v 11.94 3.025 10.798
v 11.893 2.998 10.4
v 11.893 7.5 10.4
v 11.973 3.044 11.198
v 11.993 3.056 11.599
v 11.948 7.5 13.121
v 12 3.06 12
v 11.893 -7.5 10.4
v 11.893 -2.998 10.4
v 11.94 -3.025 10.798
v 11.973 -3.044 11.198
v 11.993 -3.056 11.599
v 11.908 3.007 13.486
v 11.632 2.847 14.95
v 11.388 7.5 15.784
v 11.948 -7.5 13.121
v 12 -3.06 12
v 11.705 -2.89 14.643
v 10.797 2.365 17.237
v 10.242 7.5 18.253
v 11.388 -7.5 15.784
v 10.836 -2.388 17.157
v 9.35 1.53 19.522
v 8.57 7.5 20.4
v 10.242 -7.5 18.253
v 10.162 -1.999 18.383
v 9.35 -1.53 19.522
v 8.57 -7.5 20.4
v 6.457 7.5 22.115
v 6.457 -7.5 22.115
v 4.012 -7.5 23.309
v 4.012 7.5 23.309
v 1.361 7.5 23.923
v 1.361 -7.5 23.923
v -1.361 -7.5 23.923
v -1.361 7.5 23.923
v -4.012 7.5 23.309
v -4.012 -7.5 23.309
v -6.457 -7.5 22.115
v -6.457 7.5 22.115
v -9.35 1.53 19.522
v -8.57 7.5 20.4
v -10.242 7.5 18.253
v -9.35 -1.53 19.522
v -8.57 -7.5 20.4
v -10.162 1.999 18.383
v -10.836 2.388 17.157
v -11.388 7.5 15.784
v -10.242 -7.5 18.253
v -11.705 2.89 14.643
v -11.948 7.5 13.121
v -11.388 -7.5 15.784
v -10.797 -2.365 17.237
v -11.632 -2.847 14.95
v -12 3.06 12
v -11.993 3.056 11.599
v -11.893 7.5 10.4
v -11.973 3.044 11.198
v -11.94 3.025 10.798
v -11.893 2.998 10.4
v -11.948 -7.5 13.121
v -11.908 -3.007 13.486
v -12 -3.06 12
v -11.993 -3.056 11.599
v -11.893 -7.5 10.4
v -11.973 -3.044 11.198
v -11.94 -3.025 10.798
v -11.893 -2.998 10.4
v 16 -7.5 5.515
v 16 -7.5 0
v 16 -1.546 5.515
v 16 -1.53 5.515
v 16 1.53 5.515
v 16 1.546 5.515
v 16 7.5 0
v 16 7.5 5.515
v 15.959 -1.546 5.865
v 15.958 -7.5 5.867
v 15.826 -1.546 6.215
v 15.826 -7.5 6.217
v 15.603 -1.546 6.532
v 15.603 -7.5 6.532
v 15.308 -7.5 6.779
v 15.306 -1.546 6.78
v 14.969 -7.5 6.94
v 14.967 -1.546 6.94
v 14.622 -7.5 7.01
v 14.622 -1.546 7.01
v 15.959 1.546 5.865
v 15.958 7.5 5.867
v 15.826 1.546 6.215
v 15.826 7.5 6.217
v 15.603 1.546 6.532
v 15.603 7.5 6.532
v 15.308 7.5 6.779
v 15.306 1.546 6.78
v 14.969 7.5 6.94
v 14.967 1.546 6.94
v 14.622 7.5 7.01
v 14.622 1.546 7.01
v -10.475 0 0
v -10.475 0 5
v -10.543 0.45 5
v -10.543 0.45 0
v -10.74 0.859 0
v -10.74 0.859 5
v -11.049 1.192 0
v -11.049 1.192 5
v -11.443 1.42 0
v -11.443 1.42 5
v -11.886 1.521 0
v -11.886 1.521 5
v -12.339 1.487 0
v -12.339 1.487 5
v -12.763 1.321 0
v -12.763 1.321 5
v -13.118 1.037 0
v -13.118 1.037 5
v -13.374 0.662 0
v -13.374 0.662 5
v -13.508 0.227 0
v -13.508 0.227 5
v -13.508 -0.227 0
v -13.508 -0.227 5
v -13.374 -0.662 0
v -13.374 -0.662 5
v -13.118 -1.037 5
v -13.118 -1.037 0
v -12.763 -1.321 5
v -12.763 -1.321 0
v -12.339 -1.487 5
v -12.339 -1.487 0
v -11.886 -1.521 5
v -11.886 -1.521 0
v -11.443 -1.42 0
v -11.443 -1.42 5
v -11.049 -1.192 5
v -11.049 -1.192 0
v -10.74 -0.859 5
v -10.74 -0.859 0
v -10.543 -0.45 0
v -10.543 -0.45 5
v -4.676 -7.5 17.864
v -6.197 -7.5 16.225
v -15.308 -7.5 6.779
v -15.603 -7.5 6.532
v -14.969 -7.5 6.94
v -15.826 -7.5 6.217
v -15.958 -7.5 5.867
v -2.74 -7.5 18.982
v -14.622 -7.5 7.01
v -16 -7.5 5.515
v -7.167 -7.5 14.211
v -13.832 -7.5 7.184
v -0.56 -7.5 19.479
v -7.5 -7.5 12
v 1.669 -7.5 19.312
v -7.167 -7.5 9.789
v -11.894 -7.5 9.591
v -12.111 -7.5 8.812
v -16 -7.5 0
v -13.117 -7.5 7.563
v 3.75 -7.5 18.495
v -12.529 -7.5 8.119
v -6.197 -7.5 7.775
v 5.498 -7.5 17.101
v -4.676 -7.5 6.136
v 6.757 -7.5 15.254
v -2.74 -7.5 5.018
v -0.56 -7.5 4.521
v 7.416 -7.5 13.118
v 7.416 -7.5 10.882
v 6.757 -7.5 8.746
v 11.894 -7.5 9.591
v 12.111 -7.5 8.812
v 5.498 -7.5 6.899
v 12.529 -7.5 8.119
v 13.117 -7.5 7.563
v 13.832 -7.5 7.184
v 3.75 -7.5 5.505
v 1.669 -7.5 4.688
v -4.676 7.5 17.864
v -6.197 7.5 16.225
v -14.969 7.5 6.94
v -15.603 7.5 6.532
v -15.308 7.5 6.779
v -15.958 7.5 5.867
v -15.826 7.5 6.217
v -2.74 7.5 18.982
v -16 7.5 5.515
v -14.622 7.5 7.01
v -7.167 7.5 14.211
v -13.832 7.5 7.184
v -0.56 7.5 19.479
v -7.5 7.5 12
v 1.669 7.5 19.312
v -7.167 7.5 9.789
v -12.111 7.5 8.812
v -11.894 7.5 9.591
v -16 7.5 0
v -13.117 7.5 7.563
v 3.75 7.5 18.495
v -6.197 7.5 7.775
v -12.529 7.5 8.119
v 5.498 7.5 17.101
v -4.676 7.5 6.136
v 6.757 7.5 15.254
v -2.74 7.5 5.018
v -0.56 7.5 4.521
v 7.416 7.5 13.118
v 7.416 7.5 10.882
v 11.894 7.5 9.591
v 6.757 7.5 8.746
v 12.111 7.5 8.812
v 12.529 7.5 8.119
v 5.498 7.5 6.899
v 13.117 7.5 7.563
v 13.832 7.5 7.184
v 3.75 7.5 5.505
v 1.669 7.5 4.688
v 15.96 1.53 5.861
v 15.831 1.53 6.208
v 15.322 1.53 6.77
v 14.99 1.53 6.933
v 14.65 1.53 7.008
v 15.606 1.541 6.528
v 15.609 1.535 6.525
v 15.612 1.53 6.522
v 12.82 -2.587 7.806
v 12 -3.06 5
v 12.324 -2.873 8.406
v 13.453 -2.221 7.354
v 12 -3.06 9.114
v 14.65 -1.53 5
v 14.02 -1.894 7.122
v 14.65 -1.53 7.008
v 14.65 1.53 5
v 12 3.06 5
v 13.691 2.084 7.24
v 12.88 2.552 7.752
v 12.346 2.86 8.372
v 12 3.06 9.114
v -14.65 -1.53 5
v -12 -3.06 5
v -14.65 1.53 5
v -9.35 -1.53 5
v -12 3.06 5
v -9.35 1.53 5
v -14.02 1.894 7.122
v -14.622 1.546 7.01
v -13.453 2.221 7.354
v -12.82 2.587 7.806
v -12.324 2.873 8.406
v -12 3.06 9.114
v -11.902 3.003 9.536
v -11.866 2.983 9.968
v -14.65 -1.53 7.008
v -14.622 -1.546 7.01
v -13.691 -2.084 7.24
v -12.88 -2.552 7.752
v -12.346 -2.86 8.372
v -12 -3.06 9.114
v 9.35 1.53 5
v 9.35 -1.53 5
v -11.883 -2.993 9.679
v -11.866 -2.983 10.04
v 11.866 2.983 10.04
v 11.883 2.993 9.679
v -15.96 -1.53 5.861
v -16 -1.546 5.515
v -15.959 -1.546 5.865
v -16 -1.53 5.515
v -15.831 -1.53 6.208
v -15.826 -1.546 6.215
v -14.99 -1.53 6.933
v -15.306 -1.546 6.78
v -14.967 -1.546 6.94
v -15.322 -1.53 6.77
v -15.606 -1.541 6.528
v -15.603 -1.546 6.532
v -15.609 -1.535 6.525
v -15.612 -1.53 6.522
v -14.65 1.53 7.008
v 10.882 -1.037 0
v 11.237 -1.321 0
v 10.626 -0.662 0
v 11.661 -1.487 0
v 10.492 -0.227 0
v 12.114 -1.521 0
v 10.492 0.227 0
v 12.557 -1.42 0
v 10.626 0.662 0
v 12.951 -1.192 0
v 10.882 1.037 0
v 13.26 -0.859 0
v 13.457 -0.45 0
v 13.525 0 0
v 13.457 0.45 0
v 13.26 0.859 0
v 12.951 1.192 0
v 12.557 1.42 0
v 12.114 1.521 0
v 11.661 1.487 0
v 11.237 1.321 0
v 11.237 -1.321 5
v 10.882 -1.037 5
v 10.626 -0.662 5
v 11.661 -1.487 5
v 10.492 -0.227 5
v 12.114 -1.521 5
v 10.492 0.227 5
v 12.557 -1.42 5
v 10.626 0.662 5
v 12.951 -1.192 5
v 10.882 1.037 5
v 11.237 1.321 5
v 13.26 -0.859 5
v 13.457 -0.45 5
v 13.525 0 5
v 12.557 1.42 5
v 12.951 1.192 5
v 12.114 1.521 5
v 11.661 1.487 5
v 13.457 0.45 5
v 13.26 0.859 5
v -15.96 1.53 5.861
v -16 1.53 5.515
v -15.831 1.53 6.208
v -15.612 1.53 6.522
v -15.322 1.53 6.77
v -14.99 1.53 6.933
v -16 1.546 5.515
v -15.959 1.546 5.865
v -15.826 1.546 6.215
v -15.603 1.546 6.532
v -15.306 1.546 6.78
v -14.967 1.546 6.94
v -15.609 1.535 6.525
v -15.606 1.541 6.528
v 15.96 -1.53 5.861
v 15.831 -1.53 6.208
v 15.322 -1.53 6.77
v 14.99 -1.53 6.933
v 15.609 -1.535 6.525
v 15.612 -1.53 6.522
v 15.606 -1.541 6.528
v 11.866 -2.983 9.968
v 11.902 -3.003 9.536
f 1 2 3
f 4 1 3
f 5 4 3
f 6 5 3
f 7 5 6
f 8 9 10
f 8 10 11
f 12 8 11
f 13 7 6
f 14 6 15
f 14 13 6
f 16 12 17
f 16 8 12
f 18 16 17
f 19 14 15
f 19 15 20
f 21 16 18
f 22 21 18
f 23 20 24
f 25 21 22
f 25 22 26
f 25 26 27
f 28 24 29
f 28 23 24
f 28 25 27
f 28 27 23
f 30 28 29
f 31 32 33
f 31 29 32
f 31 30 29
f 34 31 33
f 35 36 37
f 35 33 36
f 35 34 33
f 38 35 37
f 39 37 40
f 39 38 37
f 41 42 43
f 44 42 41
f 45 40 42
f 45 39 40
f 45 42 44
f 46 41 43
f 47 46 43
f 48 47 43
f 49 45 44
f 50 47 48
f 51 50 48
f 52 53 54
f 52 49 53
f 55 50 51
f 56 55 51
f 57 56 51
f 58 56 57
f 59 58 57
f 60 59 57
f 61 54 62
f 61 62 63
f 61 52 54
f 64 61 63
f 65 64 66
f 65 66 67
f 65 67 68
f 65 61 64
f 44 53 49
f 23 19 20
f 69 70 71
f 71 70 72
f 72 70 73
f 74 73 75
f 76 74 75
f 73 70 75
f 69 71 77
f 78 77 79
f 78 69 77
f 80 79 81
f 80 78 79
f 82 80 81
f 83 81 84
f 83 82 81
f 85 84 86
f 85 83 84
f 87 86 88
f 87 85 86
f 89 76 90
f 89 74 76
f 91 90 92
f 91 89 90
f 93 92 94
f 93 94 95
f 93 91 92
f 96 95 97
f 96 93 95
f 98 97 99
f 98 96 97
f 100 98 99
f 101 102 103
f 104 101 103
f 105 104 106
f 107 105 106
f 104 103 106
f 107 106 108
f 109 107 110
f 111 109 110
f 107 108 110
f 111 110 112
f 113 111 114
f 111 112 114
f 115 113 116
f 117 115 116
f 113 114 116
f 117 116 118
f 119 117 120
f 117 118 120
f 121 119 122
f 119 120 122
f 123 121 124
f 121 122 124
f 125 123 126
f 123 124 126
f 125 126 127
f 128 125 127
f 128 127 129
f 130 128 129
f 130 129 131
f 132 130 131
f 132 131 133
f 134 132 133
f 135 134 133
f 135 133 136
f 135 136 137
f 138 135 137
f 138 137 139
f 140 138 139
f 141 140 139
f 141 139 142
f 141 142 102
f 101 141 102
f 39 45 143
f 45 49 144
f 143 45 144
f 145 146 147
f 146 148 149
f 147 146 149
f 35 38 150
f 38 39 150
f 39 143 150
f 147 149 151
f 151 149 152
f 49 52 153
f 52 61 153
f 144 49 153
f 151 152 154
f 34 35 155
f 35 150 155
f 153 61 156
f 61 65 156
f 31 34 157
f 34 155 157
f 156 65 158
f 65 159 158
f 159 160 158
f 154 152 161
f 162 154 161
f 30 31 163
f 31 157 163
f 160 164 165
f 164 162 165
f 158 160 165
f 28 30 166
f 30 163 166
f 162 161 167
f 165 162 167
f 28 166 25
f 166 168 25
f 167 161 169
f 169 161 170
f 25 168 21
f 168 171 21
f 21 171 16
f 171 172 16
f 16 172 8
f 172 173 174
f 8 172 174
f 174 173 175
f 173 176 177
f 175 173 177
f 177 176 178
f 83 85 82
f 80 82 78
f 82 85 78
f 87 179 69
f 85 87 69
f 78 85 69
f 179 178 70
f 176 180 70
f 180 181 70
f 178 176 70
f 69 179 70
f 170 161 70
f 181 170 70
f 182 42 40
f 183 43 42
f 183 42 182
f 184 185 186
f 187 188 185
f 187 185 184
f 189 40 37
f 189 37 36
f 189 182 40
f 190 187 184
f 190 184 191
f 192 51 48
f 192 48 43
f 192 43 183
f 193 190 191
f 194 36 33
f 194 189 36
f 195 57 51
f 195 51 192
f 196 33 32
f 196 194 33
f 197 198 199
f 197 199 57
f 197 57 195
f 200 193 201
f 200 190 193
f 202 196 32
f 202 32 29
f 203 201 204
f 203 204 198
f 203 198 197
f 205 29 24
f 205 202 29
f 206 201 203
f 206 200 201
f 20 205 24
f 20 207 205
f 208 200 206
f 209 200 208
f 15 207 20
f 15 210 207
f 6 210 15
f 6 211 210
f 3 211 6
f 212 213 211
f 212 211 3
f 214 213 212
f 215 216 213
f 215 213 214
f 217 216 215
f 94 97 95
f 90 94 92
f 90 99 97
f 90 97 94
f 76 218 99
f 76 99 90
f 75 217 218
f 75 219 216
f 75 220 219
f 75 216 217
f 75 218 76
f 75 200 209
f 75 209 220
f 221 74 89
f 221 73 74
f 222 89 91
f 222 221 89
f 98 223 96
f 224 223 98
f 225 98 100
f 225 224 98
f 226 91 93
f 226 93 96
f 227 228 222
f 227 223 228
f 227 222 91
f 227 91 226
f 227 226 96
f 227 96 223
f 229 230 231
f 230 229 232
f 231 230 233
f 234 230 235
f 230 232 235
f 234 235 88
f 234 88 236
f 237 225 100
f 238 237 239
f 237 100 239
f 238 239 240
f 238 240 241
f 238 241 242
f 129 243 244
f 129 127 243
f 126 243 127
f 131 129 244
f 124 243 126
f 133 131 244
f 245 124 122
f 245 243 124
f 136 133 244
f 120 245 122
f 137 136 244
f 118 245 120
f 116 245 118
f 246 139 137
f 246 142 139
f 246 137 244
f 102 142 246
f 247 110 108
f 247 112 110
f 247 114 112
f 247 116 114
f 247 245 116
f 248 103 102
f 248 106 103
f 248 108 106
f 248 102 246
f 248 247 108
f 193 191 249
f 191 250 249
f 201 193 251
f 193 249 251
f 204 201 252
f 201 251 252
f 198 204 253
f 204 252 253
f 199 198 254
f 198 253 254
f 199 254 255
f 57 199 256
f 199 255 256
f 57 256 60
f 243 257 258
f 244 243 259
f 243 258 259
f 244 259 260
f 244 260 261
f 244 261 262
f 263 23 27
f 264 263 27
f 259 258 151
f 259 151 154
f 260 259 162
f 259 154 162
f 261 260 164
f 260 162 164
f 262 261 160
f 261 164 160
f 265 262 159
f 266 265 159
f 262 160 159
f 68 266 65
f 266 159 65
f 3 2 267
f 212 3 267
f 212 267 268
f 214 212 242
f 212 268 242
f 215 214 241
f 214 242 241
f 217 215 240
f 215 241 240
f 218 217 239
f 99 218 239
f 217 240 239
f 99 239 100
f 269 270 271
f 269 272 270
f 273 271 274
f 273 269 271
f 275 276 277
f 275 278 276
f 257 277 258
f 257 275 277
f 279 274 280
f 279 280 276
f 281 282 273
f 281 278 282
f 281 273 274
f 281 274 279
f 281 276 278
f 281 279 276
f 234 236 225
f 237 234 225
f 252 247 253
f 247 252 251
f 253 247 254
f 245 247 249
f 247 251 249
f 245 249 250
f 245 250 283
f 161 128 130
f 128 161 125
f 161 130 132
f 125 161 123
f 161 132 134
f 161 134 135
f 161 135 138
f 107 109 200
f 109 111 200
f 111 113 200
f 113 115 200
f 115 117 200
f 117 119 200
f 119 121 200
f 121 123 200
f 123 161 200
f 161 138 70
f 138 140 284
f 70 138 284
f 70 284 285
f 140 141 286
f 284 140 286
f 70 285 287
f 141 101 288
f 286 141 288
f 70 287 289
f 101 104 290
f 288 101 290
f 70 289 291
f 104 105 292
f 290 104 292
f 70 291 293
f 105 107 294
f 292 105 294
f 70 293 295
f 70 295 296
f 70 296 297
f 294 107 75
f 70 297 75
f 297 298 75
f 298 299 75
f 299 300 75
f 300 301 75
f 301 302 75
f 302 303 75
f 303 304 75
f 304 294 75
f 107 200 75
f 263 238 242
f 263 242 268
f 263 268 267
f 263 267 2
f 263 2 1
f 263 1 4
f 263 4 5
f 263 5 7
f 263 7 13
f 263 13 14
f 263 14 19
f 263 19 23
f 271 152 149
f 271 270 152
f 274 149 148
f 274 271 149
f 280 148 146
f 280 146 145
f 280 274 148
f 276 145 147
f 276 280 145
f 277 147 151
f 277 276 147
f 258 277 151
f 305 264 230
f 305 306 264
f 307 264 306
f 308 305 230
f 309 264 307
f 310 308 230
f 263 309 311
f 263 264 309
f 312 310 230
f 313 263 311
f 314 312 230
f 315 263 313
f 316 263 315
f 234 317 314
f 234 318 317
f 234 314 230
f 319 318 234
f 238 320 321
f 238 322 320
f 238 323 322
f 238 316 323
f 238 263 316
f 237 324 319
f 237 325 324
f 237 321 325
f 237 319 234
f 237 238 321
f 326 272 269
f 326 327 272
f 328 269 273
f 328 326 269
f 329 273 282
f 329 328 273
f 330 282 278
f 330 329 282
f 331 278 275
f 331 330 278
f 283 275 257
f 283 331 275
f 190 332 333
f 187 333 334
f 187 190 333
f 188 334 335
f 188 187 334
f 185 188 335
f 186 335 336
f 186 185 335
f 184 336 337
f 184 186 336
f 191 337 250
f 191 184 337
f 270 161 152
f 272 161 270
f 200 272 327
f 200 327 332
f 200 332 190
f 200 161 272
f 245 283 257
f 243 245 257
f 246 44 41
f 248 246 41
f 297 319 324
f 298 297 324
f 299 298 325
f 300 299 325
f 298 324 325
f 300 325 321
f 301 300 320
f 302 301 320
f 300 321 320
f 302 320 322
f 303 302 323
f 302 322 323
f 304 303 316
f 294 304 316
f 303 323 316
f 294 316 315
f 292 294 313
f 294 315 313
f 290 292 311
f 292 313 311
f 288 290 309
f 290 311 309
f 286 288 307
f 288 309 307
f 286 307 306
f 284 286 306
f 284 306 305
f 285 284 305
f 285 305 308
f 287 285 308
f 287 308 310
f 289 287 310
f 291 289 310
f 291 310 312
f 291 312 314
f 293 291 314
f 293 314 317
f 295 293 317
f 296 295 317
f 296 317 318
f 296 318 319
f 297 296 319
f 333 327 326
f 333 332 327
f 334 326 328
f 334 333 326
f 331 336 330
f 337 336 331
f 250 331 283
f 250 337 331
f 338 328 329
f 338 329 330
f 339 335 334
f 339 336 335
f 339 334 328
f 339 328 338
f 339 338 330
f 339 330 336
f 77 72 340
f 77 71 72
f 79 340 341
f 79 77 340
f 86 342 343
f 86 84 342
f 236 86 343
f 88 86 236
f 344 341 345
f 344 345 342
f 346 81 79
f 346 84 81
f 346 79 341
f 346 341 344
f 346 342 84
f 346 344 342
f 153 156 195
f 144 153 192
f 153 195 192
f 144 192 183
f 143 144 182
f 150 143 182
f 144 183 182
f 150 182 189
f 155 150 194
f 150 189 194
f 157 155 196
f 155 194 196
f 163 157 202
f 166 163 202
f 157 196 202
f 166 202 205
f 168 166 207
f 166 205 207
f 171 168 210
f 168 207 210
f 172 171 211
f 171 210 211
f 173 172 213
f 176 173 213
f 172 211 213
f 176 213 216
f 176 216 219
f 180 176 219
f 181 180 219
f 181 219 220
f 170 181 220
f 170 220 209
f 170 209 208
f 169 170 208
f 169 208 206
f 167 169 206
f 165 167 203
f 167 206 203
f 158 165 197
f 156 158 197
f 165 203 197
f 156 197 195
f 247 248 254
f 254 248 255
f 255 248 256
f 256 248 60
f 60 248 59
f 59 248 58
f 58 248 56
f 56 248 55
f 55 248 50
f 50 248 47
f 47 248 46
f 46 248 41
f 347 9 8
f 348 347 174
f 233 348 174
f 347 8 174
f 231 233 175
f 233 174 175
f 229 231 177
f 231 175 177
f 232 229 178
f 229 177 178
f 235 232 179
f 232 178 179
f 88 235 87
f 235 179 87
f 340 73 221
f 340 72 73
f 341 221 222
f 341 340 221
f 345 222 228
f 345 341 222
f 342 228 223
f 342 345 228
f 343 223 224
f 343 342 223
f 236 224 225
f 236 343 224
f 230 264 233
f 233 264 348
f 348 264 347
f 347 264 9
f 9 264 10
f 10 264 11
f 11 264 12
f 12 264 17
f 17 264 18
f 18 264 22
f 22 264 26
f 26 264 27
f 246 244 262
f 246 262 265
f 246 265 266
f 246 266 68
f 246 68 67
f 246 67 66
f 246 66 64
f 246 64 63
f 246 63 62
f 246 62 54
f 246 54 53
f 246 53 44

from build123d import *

# Parameters (mm, degrees)
SKETCH_W          = 32
SKETCH_H          = 15
PAD_DEPTH         = 24
SKETCH001_W       = 7.5
SKETCH001_H       = 15
SKETCH002_R       = 1.525
HOLE_DEPTH        = 25
POCKET_DEPTH      = 7.501
POCKET_DEPTH_BACK = -7.501
POCKET001_DEPTH   = 19
FILLET_R          = 1.5


with BuildPart() as part:
    # Sketch → Pad (new body)
    with BuildSketch(Plane.XY):
        Rectangle(SKETCH_W, SKETCH_H)
    extrude(amount=PAD_DEPTH)

    # Sketch001 → Groove (revolve, cut)
    with BuildSketch(Plane.XY.offset(12)):
        with Locations((-3.75, 0)):
            Rectangle(SKETCH001_W, SKETCH001_H)
    revolve(axis=Axis((0, 0, 12), (0, 1, 0)), mode=Mode.SUBTRACT)

    # Sketch002 → Hole (cut)
    with BuildSketch(Plane.XY.offset(24)):
        with Locations((12, 0)):
            Circle(SKETCH002_R)
        with Locations((-12, 0)):
            Circle(SKETCH002_R)
    extrude(amount=-HOLE_DEPTH, mode=Mode.SUBTRACT)

    # Sketch004 → Pocket (cut, two sides)
    with BuildSketch(Plane.XZ) as pocket_sk:
        with BuildLine():
            Line((-25, 7), (-14.866069, 7))
            ThreePointArc((-14.866069, 7), (-12.607751, 8.025158), (-11.892855, 10.4))
            ThreePointArc((11.892855, 10.4), (0, 24), (-11.892855, 10.4))
            ThreePointArc((11.892855, 10.4), (12.607751, 8.025158), (14.866069, 7))
            Line((14.866069, 7), (25, 7))
            Line((25, 7), (25, 37.147858))
            Line((25, 37.147858), (-25, 37.147858))
            Line((-25, 7), (-25, 37.147858))
        make_face()
    extrude(amount=-POCKET_DEPTH, mode=Mode.SUBTRACT)
    extrude(pocket_sk.sketch, amount=-POCKET_DEPTH_BACK, mode=Mode.SUBTRACT)

    # Sketch003 → Pocket001 (cut)
    with BuildSketch(Plane.XY.offset(24)):
        Polygon((14.65, 1.529978), (12, 3.059956), (9.35, 1.529978), (9.35, -1.529978), (12, -3.059956), (14.65, -1.529978), align=None)
        Polygon((-9.35, 1.529978), (-12, 3.059956), (-14.65, 1.529978), (-14.65, -1.529978), (-12, -3.059956), (-9.35, -1.529978), align=None)
    extrude(amount=-POCKET001_DEPTH, mode=Mode.SUBTRACT)

    # Fillet
    fillet_edges = [part.edges().sort_by_distance(p)[0] for p in [
        (16, 0, 7),
        (-16, 0, 7),
    ]]
    fillet(fillet_edges, radius=FILLET_R)


solid = part.part
